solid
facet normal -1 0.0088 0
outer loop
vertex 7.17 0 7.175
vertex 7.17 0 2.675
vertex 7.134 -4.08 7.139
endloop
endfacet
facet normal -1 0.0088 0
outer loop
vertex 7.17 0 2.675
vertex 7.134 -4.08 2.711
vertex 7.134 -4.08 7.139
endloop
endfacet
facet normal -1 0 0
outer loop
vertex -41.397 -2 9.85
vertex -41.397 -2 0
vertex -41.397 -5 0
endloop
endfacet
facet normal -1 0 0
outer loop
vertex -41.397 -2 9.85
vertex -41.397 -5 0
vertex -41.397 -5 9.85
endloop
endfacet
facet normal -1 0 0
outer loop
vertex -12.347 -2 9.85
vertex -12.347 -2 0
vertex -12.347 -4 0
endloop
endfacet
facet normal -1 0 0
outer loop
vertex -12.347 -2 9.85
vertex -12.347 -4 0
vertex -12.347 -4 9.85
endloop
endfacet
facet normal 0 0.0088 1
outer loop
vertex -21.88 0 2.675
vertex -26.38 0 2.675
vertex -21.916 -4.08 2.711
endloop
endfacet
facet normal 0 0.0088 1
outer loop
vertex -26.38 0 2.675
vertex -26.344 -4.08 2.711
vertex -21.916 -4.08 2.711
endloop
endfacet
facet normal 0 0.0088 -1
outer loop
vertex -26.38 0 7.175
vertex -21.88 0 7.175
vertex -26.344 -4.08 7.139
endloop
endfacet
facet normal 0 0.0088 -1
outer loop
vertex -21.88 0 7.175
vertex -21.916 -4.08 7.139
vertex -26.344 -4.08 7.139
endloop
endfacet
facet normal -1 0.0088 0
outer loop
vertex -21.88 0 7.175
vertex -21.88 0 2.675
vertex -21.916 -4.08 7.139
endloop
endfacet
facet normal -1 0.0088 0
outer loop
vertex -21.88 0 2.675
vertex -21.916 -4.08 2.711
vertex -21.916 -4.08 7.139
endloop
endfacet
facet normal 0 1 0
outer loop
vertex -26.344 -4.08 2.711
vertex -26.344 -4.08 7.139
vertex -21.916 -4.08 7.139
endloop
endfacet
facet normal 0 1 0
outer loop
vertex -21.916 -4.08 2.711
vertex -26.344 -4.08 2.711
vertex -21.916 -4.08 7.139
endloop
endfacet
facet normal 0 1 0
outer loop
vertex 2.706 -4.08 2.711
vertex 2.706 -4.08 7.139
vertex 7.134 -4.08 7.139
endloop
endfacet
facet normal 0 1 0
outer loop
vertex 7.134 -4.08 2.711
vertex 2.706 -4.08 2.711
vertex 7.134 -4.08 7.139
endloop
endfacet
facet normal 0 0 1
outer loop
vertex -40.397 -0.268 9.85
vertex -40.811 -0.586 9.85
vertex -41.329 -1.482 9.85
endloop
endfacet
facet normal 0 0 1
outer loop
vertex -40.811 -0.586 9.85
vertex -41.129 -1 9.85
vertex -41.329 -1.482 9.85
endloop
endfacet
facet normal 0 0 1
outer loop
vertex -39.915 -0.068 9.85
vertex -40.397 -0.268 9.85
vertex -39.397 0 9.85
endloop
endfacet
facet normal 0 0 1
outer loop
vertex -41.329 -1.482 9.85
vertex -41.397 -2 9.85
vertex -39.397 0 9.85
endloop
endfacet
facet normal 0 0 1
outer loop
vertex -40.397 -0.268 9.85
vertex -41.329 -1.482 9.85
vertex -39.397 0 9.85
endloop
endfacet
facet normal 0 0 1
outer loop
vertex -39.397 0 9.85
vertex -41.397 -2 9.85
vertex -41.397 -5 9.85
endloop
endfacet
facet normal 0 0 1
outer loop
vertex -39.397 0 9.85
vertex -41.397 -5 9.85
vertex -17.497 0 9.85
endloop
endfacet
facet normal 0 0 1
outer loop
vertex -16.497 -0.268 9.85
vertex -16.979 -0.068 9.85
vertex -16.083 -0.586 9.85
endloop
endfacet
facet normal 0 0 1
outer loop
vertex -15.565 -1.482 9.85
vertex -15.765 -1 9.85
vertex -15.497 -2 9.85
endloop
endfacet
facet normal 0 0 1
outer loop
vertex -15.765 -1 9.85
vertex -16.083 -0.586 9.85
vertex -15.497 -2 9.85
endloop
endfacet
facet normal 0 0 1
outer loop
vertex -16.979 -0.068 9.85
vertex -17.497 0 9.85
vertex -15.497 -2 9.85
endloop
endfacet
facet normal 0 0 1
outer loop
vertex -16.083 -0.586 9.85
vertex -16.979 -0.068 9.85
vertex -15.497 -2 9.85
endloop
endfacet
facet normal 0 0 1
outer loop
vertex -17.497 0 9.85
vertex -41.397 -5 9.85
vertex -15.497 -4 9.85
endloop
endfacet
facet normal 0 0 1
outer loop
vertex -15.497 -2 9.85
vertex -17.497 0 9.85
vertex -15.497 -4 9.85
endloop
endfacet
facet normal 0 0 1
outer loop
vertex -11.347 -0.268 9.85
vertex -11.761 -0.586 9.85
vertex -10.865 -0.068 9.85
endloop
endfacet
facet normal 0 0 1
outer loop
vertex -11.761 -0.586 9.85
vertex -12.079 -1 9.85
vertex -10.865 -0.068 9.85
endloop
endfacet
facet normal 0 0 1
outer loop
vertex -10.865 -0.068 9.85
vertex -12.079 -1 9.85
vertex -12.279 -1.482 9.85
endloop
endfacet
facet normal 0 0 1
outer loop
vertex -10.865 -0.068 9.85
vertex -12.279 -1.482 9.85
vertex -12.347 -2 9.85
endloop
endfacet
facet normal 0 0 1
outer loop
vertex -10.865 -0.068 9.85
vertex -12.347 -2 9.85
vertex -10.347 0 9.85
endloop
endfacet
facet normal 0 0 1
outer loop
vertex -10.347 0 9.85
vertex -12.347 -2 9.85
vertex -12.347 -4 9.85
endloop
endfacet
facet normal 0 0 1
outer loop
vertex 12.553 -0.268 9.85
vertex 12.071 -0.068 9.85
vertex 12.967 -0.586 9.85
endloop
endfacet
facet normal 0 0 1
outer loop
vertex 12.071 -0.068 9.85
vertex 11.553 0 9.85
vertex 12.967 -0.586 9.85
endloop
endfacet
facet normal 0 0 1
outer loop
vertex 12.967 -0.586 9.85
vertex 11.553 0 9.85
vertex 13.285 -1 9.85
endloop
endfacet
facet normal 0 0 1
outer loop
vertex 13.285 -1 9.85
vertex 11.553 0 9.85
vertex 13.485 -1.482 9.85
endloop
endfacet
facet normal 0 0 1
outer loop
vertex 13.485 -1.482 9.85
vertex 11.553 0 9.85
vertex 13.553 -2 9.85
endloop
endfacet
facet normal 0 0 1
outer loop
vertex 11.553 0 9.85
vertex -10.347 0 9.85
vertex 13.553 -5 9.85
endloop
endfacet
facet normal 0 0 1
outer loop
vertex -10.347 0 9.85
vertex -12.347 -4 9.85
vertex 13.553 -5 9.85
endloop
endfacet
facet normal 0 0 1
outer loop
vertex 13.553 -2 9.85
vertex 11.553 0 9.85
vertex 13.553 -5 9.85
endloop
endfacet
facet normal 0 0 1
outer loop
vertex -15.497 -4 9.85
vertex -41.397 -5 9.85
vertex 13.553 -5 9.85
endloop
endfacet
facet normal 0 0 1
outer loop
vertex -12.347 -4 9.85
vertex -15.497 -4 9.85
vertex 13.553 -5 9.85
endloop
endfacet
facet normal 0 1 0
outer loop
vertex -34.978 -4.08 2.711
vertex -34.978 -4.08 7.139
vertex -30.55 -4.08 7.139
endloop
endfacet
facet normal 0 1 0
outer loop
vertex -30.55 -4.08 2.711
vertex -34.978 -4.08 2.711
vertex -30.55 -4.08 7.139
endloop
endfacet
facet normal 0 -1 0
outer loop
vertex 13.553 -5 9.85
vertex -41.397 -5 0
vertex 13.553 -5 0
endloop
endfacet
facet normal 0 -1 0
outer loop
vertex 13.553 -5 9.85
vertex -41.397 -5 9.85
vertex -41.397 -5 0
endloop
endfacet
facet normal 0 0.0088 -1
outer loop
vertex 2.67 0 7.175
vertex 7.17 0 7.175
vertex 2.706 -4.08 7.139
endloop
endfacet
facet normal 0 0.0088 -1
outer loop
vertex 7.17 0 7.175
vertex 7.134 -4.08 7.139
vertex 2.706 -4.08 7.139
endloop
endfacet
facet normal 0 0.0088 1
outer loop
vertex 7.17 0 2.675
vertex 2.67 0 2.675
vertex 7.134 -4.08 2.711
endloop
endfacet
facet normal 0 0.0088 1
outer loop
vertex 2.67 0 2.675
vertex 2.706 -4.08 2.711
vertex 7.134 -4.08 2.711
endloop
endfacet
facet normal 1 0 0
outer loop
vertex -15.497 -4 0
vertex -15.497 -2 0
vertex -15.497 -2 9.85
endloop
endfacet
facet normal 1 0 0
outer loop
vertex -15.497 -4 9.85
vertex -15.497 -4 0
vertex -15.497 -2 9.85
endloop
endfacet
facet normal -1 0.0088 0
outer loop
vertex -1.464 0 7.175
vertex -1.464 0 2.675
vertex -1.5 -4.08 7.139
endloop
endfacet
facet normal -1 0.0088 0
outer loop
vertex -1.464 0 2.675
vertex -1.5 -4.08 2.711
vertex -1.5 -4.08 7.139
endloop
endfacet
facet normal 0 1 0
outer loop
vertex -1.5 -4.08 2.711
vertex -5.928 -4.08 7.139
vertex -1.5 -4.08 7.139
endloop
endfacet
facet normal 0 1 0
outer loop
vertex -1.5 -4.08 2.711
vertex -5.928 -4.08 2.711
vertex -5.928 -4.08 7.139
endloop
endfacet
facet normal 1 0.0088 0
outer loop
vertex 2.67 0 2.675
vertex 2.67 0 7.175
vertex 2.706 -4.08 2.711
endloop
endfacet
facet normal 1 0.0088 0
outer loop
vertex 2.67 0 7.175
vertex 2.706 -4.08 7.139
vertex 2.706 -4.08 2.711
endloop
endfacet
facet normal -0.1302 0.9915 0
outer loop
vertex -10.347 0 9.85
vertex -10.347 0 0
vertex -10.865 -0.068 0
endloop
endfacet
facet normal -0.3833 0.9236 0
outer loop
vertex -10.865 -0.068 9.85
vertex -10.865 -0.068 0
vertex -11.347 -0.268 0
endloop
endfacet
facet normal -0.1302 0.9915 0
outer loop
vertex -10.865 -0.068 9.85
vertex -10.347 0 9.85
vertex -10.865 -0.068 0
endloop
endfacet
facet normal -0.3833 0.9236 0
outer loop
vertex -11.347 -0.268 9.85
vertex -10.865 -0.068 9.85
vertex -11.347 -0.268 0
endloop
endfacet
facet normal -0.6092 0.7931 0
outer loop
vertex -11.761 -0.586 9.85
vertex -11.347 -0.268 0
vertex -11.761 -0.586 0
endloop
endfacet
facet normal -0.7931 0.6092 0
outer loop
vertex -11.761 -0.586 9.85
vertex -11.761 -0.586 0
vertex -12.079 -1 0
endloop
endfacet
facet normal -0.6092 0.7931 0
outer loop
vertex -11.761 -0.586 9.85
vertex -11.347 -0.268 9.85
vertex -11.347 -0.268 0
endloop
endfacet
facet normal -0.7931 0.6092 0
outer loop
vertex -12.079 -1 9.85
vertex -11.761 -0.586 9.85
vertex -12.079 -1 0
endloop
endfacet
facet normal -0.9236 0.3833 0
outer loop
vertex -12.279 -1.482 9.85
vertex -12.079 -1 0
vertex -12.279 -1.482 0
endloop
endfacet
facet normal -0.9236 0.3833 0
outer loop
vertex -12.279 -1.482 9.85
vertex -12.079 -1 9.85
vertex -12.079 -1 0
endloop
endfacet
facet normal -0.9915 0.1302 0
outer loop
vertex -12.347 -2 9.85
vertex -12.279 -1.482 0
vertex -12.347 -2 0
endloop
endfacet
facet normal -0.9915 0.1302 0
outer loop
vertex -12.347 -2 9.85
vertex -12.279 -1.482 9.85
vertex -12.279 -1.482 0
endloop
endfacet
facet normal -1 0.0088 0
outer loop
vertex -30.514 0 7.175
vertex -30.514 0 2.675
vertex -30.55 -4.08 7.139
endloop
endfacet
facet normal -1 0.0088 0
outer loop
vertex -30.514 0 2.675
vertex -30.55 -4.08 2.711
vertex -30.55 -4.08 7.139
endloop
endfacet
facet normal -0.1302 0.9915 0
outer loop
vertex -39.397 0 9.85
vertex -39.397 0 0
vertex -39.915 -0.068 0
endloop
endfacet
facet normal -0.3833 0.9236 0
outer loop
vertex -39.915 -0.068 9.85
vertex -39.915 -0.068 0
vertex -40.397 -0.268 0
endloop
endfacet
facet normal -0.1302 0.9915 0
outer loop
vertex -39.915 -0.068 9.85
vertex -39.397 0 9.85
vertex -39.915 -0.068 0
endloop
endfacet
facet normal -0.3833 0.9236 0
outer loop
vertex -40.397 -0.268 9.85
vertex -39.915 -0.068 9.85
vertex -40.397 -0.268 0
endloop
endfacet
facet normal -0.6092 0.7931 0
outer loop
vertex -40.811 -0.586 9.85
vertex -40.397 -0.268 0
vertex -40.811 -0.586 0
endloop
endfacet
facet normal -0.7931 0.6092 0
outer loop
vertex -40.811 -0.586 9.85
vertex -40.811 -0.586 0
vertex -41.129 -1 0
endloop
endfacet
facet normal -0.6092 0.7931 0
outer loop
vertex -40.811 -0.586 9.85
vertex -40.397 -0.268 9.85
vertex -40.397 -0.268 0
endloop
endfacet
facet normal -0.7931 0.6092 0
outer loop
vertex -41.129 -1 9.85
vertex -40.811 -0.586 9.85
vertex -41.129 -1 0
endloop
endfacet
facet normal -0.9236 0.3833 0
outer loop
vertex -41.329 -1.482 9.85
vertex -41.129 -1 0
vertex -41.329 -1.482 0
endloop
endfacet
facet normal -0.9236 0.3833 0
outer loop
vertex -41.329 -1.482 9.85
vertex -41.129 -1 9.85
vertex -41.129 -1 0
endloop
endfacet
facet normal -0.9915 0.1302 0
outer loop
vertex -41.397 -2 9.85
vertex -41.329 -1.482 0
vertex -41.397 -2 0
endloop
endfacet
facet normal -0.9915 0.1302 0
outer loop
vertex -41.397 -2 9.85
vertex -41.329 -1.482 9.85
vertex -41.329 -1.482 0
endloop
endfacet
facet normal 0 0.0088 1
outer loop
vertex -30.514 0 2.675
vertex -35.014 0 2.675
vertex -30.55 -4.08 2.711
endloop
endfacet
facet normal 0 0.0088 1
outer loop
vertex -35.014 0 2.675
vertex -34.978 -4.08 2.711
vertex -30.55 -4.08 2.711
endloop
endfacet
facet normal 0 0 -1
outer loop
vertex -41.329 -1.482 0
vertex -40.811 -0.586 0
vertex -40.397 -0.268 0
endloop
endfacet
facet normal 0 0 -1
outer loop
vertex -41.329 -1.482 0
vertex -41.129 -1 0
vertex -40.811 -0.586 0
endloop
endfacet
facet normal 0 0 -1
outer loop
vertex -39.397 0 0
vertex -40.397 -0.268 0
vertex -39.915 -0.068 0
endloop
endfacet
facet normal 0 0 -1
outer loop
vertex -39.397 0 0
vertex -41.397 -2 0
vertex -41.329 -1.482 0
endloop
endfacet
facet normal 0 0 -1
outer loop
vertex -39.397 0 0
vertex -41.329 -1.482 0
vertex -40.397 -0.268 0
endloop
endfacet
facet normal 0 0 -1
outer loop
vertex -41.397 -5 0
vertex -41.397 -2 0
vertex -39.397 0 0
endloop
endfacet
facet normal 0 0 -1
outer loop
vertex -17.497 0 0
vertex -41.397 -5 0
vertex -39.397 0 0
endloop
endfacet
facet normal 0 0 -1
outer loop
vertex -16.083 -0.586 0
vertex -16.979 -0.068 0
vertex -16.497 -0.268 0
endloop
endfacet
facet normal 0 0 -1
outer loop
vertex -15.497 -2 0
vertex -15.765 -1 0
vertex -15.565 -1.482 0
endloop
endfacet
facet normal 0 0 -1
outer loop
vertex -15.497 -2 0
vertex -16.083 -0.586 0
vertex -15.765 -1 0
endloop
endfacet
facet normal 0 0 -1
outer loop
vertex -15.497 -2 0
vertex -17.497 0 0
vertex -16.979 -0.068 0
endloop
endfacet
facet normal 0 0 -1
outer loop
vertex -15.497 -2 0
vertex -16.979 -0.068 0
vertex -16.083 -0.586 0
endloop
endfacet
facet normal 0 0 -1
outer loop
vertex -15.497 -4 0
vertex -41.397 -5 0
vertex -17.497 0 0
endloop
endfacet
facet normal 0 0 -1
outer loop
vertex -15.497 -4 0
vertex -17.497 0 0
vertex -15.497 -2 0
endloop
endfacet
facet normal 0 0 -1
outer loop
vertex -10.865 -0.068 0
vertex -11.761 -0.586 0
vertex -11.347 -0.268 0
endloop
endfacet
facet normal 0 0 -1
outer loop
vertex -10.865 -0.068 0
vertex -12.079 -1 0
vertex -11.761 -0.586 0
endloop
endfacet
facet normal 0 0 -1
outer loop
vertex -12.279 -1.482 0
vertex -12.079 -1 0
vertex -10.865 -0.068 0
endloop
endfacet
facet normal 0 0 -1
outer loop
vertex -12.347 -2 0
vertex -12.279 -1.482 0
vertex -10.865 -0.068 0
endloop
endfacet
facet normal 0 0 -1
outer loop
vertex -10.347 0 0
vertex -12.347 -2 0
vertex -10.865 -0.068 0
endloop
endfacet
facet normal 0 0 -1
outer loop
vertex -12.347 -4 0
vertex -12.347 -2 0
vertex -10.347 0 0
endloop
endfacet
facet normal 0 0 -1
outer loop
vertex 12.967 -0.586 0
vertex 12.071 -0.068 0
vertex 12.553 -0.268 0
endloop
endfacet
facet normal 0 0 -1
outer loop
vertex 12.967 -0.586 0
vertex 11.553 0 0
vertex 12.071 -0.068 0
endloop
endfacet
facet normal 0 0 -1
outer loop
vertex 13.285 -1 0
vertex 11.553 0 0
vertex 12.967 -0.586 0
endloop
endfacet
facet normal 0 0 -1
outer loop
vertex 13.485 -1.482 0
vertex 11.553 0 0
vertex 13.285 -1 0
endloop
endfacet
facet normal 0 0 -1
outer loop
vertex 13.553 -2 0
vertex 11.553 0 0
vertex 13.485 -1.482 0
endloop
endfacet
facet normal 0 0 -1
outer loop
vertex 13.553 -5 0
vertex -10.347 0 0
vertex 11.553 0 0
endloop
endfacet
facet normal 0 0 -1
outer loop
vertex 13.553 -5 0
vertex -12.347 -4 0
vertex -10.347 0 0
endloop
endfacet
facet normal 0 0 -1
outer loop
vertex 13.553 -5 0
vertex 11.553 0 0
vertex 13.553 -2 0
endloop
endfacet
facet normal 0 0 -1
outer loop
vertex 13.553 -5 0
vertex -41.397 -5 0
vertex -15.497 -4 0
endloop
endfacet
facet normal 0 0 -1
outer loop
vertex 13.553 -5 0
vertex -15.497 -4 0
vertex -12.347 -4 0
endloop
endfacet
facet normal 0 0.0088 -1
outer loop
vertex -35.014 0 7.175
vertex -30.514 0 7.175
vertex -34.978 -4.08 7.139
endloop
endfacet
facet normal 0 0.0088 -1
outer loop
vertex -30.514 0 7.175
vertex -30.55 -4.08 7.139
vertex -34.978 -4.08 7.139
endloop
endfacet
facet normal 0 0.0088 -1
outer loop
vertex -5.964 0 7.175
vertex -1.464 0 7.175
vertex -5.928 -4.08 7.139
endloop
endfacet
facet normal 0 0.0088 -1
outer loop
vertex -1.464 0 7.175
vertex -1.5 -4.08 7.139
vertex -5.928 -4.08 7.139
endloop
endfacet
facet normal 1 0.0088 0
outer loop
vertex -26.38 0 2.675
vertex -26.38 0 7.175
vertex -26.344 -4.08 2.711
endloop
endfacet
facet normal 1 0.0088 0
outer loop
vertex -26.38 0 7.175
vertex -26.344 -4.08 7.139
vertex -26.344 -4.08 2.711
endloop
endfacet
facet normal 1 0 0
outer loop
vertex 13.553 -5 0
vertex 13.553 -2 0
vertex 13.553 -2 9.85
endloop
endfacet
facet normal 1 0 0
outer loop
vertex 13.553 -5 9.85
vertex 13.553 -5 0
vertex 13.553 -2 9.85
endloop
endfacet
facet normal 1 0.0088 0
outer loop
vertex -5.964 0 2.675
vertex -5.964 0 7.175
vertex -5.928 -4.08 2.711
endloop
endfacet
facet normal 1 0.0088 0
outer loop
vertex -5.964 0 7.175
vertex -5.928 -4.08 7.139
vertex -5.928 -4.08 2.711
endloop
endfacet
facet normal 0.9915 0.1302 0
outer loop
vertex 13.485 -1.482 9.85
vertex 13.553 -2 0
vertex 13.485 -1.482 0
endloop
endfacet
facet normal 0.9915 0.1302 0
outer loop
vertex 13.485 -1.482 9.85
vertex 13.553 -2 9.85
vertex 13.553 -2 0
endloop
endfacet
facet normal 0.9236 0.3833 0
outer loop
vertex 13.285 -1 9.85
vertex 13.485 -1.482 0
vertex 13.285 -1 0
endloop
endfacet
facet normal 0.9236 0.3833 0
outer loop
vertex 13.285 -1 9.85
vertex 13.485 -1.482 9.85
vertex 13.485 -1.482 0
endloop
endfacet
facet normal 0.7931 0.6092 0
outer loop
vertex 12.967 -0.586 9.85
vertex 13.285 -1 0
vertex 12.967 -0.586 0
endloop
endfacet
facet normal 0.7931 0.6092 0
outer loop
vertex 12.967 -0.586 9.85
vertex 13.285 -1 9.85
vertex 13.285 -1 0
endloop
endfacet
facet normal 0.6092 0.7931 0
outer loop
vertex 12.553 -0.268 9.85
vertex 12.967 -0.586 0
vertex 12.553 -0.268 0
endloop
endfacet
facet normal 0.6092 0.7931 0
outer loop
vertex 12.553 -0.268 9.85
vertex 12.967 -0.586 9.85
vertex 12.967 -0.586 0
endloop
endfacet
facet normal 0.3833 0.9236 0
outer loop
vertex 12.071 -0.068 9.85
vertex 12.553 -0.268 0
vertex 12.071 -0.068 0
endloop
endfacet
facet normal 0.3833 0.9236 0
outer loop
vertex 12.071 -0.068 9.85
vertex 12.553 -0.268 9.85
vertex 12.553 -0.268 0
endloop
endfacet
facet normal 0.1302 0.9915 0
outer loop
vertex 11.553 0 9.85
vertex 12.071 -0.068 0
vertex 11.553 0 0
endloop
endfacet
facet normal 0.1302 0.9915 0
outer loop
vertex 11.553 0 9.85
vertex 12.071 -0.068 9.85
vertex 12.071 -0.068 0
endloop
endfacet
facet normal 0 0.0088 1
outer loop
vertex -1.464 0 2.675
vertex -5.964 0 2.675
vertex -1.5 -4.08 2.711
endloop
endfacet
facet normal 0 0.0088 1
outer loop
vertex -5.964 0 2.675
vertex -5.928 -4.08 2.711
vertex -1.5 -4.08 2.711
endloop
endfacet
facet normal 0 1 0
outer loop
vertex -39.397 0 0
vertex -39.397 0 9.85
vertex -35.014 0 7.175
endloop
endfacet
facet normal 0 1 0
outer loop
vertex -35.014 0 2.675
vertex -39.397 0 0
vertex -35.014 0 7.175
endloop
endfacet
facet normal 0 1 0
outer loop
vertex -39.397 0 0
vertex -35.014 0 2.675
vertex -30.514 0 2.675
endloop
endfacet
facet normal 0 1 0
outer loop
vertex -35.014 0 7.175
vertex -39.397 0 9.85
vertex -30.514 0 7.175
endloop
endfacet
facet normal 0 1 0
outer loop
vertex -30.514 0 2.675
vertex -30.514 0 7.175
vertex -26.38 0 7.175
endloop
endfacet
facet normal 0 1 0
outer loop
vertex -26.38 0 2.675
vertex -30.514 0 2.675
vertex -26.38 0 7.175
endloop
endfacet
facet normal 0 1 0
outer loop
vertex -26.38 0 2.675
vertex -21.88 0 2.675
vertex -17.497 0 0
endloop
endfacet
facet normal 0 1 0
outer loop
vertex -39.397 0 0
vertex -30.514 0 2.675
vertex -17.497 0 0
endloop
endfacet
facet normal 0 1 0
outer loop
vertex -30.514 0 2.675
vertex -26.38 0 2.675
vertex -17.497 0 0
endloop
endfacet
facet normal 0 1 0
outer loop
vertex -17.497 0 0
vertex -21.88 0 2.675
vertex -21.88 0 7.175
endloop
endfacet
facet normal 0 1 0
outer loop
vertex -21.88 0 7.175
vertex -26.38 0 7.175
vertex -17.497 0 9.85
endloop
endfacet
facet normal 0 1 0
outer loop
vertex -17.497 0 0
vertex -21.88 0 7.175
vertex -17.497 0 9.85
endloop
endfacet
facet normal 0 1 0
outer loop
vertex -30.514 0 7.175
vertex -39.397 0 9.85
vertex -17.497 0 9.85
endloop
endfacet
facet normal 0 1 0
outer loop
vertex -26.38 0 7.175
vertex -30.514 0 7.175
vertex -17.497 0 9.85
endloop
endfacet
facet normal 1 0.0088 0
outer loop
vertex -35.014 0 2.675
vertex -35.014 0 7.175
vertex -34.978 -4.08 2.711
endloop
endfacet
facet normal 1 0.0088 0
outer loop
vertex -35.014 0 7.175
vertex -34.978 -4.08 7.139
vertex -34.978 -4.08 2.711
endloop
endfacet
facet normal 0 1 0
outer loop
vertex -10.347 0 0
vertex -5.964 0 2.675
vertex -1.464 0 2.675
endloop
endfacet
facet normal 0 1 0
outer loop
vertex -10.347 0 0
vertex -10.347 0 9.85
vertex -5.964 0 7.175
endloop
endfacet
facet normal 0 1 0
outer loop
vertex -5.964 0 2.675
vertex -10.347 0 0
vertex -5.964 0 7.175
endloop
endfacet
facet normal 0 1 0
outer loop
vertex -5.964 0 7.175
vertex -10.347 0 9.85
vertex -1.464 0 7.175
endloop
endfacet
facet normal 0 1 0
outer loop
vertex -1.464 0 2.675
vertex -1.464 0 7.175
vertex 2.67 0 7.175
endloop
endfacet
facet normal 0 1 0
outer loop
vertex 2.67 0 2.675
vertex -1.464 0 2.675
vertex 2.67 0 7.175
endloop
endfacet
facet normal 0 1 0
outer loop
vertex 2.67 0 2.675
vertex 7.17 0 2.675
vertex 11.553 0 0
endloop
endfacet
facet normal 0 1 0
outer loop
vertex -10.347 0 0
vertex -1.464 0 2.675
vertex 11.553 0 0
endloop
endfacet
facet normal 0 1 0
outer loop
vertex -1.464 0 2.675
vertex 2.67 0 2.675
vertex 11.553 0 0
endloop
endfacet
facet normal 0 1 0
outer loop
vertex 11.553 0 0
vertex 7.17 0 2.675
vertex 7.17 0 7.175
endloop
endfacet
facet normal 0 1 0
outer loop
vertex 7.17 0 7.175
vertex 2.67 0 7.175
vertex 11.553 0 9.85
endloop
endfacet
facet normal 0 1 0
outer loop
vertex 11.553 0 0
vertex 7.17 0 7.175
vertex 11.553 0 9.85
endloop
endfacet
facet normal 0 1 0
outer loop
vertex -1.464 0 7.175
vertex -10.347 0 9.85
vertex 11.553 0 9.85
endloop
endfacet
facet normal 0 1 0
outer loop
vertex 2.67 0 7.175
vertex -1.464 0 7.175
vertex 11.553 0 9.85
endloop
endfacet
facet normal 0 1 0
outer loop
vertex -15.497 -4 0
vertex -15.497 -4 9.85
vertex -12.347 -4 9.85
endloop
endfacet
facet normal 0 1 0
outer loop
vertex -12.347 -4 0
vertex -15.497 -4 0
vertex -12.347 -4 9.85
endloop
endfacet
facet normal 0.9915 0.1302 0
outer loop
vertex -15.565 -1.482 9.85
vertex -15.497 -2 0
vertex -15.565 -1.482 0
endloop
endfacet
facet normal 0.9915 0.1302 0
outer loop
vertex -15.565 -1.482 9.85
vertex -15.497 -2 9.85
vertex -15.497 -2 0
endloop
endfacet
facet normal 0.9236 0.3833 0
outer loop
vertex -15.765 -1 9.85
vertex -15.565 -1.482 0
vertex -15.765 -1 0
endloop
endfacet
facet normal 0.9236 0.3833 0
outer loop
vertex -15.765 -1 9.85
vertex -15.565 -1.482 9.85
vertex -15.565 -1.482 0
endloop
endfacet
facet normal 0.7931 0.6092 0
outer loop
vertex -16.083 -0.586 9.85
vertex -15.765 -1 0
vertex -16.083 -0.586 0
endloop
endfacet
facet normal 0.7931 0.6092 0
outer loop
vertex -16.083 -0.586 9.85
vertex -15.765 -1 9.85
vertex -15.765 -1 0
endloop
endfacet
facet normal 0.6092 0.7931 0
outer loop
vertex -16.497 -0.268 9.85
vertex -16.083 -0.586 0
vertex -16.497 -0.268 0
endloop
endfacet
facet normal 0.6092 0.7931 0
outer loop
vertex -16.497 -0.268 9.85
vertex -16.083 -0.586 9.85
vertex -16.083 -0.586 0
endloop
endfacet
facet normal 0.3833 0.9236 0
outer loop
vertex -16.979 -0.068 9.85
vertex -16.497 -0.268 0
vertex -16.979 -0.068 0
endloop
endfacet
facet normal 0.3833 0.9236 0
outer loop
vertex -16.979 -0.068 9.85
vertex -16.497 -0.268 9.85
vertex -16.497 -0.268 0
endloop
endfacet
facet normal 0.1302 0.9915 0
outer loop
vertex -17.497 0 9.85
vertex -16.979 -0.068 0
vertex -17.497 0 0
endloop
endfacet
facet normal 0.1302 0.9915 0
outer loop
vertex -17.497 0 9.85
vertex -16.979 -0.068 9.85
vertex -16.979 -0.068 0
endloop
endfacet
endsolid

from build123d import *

# Parameters (mm, degrees)
F0_W     = 25.9
F0_H     = 9.85
F0_W_2   = 4.5
F0_H_2   = 4.5
F1_DEPTH = 5
F2_DEPTH = 4.08
F2_TAPER = 0.5
F3_W     = 3.15
F3_H     = 9.85
F4_DEPTH = 1
F5_R     = 2


with BuildPart() as f1:
    # F0 (on Front) → F1 (new body)
    with BuildSketch(Plane.XZ):
        with Locations((-28.4469606161, 4.925)):
            Rectangle(F0_W, F0_H)
        with Locations((-32.7639606161, 4.925)):
            Rectangle(F0_W_2, F0_H_2, mode=Mode.SUBTRACT)
        with Locations((-24.1299606161, 4.925)):
            Rectangle(F0_W_2, F0_H_2, mode=Mode.SUBTRACT)
        with Locations((-24.1299606161, 4.925)):
            Rectangle(F0_W_2, F0_H_2)
        with Locations((-32.7639606161, 4.925)):
            Rectangle(F0_W_2, F0_H_2)
    extrude(amount=F1_DEPTH)


with BuildPart() as f1b:
    # F0 (on Front) → F1, piece 2 (new body)
    with BuildSketch(Plane.XZ):
        with Locations((0.6030393839, 4.925)):
            Rectangle(F0_W, F0_H)
        with Locations((-3.7139606161, 4.925)):
            Rectangle(F0_W_2, F0_H_2, mode=Mode.SUBTRACT)
        with Locations((4.9200393839, 4.925)):
            Rectangle(F0_W_2, F0_H_2, mode=Mode.SUBTRACT)
        with Locations((4.9200393839, 4.925)):
            Rectangle(F0_W_2, F0_H_2)
        with Locations((-3.7139606161, 4.925)):
            Rectangle(F0_W_2, F0_H_2)
    extrude(amount=F1_DEPTH)


with BuildPart() as f2_tool:
    # F0 (on Front) → F2 (new body)
    with BuildSketch(Plane.XZ):
        with Locations((4.9200393839, 4.925)):
            Rectangle(F0_W_2, F0_H_2)
        with Locations((-3.7139606161, 4.925)):
            Rectangle(F0_W_2, F0_H_2)
        with Locations((-24.1299606161, 4.925)):
            Rectangle(F0_W_2, F0_H_2)
        with Locations((-32.7639606161, 4.925)):
            Rectangle(F0_W_2, F0_H_2)
    extrude(amount=F2_DEPTH, taper=F2_TAPER)


with BuildPart() as f1_1:
    add(f1.part)

    # F2: cut by f2_tool
    add(f2_tool.part, mode=Mode.SUBTRACT)



with BuildPart() as f1b_1:
    add(f1b.part)

    # F2: cut by f2_tool
    add(f2_tool.part, mode=Mode.SUBTRACT)


with BuildPart() as f1_2:
    add(f1_1.part)

    add(f1b_1.part)  # F4 merges F1b
    # F3 (on face) → F4 (join)
    with BuildSketch(Plane.XZ.offset(5)):
        with Locations((-13.9219606161, 4.925)):
            Rectangle(F3_W, F3_H)
    extrude(amount=-F4_DEPTH)

    # F5
    f5_edges = [f1_2.edges().sort_by_distance(p)[0] for p in [
        (-12.346961, 0, 4.925),
        (-15.496961, 0, 4.925),
        (13.553039, 0, 4.925),
        (-41.396961, 0, 4.925),
    ]]
    fillet(f5_edges, radius=F5_R)


solid = f1_2.part
